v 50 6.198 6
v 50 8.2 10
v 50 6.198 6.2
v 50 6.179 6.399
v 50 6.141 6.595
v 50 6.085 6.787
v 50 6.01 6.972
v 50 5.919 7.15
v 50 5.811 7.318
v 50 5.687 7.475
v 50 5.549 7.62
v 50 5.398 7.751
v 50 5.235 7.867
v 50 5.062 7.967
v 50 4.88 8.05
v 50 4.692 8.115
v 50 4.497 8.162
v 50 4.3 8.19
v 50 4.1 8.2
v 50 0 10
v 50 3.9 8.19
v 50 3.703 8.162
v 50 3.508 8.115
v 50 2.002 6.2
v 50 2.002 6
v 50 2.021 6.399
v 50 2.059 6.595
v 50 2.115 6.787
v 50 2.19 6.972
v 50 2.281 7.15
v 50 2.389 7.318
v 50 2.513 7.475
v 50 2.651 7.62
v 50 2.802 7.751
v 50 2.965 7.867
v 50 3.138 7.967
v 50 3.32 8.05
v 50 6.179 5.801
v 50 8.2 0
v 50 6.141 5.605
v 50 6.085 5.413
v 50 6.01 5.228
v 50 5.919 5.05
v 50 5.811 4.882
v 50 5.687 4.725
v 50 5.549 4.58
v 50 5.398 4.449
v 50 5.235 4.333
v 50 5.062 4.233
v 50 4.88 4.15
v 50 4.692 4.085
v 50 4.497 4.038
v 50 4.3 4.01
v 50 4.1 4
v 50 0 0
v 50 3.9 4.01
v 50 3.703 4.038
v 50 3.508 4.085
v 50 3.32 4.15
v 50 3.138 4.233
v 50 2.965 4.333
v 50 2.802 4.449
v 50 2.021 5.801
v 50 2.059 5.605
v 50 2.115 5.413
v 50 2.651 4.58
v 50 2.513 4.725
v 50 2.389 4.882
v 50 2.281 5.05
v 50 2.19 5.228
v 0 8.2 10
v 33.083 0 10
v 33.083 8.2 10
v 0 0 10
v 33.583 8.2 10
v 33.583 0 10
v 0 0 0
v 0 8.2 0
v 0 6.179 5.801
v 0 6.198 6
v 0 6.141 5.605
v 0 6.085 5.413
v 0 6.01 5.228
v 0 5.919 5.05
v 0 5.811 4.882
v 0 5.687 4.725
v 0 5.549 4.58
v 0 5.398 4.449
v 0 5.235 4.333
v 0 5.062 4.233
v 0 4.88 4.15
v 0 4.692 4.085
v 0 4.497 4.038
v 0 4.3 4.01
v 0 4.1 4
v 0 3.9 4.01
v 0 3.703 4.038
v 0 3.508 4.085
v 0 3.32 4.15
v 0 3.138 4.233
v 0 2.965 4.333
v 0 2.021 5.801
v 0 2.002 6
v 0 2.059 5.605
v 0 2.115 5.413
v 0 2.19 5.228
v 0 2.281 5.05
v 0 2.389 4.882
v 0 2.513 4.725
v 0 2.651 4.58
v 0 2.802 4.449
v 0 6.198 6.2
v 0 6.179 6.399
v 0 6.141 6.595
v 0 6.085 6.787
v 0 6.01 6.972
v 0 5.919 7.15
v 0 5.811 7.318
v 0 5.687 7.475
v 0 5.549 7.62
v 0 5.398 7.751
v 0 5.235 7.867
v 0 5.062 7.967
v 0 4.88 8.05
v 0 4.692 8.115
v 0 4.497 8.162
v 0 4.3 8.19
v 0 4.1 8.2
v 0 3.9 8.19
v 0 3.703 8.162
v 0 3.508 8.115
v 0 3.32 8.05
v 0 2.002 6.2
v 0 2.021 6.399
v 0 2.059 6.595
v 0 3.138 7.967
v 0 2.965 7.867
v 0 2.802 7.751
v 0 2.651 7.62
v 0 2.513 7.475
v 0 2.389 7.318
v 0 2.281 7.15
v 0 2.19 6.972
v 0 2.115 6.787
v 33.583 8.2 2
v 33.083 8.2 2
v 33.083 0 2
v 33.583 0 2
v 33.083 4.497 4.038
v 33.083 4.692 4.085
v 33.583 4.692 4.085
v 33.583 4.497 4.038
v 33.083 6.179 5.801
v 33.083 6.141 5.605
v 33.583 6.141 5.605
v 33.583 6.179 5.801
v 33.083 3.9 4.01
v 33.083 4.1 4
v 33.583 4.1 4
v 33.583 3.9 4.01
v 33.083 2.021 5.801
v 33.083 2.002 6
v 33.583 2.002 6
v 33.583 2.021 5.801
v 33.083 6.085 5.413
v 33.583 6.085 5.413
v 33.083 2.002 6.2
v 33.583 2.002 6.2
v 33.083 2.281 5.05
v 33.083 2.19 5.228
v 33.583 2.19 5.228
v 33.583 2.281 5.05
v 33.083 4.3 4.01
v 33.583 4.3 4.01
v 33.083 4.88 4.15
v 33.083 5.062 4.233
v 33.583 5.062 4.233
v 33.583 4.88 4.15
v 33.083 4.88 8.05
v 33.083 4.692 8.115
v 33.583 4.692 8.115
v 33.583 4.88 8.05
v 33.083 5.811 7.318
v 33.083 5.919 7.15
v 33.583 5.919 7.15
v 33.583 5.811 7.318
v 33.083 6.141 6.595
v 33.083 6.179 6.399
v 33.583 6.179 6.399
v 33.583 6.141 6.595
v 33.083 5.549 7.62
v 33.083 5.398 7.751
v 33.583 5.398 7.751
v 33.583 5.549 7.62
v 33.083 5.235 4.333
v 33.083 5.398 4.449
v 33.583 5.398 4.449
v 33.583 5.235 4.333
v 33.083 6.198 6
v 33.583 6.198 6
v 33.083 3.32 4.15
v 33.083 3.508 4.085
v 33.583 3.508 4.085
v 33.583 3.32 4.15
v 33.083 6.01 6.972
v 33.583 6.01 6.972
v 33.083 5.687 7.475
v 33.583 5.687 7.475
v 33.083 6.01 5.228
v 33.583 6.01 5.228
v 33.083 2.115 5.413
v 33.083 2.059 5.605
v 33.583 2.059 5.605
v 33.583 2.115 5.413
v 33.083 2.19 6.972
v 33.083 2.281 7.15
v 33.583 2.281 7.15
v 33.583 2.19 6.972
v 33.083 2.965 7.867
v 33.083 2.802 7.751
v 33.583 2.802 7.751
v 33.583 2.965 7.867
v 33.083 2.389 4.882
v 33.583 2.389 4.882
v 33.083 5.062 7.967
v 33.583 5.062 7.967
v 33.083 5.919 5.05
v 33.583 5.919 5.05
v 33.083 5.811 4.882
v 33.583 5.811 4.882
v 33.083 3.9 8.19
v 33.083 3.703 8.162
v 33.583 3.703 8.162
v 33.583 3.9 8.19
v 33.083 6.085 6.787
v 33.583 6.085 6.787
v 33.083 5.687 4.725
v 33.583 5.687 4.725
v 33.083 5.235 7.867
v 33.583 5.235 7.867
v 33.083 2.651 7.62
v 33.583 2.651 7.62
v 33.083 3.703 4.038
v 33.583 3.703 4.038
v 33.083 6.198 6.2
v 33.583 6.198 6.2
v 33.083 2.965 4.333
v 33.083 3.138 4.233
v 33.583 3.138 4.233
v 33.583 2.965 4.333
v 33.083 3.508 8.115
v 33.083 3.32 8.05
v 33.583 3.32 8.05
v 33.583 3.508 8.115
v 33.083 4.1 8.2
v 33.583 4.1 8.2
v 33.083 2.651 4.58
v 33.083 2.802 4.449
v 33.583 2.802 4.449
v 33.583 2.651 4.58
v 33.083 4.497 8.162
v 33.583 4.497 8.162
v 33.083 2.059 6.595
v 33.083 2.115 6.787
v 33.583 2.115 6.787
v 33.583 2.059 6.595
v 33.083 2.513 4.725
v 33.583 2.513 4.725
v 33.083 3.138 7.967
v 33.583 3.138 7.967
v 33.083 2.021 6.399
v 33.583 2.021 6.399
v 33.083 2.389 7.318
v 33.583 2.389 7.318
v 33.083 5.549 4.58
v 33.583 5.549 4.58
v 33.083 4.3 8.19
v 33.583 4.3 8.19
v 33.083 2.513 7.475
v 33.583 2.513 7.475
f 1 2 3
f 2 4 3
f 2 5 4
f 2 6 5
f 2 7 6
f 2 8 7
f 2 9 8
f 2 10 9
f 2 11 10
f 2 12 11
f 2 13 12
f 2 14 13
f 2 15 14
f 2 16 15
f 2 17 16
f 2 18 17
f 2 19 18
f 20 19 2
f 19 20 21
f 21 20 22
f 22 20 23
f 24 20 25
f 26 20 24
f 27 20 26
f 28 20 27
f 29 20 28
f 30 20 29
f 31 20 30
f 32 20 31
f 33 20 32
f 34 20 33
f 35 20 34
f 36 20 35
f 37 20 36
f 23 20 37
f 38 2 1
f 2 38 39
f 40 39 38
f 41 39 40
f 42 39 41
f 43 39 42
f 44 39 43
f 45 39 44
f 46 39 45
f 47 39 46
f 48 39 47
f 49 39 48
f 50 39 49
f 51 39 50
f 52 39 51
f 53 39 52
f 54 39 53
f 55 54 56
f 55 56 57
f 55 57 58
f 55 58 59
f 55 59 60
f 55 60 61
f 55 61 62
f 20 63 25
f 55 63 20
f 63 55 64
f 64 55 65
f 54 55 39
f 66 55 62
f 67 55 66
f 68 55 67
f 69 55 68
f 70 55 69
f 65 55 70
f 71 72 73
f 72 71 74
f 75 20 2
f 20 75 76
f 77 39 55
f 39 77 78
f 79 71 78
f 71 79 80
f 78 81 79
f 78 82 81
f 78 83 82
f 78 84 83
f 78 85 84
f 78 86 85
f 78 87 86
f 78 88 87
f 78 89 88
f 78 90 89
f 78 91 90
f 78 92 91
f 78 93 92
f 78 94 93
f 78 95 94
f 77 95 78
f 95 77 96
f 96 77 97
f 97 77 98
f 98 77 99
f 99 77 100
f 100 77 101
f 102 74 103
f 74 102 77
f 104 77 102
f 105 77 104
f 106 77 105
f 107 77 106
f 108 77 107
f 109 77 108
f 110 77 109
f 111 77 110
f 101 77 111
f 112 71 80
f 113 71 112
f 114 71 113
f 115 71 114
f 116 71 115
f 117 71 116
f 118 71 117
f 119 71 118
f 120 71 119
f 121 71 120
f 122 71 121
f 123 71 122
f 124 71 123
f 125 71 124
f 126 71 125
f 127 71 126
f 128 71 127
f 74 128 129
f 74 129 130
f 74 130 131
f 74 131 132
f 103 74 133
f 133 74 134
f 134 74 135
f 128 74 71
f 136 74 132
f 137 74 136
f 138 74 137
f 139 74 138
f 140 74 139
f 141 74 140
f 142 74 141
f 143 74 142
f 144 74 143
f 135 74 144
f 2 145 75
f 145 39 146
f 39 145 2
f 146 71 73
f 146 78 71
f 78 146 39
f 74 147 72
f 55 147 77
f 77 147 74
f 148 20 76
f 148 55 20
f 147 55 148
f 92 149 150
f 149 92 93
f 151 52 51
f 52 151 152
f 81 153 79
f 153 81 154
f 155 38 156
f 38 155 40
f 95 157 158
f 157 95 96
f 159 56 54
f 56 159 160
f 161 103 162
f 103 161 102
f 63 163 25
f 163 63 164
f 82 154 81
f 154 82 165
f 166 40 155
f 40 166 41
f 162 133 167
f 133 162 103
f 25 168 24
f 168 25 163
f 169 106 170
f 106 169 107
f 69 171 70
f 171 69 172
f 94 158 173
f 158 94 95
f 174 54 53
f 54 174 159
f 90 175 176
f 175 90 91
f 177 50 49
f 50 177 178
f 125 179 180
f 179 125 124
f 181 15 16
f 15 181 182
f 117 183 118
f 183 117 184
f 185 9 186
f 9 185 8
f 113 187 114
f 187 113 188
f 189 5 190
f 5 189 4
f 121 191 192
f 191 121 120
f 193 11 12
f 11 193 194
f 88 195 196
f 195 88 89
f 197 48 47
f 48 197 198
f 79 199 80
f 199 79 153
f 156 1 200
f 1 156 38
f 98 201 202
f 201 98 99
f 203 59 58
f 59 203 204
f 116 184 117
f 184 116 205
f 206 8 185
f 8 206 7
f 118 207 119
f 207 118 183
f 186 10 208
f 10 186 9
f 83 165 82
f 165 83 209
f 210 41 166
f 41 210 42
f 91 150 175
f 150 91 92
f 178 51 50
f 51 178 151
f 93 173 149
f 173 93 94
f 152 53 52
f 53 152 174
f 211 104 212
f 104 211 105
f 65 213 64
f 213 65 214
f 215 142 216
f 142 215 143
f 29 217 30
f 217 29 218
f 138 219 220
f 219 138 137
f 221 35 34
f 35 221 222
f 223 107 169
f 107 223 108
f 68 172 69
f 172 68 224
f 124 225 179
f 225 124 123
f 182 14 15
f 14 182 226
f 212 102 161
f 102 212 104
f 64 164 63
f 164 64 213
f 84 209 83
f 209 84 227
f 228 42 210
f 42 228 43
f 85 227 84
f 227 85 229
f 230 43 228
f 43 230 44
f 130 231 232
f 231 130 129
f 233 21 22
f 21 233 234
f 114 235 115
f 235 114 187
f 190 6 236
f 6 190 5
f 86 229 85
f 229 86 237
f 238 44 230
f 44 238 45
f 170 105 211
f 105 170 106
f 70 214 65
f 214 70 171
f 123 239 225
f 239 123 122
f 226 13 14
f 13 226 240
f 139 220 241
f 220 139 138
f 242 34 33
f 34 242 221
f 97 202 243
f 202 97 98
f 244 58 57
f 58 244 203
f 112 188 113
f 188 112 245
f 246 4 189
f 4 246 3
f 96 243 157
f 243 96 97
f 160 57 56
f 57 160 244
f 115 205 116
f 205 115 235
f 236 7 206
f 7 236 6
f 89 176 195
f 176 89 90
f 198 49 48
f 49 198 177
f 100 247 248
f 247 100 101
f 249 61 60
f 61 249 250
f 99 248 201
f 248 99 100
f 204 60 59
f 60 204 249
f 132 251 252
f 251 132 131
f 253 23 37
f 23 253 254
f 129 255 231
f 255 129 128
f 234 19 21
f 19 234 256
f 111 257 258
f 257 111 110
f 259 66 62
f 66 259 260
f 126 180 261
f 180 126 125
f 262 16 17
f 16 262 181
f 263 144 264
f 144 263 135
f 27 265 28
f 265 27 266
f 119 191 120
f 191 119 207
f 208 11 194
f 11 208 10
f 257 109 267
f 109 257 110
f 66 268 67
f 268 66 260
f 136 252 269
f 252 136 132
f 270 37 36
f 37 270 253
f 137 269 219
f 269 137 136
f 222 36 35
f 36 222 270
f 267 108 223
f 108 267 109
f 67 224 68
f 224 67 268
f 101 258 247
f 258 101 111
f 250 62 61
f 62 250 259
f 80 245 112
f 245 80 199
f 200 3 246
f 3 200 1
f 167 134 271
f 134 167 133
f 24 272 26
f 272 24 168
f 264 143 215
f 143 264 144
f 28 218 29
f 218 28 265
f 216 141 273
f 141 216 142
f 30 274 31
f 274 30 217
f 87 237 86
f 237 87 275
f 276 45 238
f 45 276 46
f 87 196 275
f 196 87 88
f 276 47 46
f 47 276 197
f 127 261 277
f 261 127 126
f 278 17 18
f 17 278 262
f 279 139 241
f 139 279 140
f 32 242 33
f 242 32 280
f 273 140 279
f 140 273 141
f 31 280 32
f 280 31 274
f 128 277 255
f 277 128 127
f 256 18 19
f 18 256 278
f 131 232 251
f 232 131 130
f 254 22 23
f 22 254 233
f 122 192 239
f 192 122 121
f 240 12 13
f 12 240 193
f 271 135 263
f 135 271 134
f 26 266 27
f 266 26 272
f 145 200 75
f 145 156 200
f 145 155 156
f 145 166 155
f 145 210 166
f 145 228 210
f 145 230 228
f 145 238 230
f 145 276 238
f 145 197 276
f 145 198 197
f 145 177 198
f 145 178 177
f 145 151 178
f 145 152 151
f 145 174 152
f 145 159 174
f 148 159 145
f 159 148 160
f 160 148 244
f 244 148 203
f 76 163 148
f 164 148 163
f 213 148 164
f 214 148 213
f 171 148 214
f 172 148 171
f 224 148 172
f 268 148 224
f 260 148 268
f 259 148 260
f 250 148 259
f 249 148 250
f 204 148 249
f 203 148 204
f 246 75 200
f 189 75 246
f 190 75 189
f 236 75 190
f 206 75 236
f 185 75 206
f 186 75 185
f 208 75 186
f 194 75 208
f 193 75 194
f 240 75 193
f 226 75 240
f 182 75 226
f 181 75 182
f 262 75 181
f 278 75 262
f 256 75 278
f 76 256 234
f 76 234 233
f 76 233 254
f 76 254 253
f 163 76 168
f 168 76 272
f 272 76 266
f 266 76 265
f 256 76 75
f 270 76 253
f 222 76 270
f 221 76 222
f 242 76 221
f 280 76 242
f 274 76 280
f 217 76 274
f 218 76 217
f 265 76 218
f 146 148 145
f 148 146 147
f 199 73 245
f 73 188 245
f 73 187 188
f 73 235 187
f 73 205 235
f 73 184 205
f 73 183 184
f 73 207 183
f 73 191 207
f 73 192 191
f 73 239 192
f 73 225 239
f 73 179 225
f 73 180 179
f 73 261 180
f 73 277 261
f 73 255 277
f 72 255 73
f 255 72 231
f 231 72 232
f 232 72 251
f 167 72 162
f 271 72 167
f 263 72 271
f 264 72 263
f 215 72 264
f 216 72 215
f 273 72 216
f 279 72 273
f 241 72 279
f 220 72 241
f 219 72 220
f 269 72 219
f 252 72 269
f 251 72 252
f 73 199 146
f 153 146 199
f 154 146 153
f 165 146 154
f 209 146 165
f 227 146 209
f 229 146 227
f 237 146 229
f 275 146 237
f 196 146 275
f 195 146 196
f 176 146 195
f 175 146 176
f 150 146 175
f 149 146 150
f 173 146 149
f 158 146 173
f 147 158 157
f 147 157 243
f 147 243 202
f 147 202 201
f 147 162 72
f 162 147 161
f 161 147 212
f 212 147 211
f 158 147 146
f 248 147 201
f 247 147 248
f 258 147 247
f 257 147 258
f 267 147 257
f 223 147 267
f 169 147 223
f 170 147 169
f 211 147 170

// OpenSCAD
d = 4;
t = 2;

l = 50;
tol = 0.1;

$fa = 0.2;
$fs = 0.2;

w = d+t*2+tol*2;

hole_t = 0.5;


difference() {
cube([l, w, d + t * 3]);

translate([-tol,t+tol+d/2,t*2+tol+d/2])
rotate([0,90,0])
cylinder(d = d+tol*2, h = l + tol*2);
    
    translate([l*2/3-hole_t/2,-d*5, t])
    cube([hole_t, d*10, t*2+tol*3+d]);
    
}
